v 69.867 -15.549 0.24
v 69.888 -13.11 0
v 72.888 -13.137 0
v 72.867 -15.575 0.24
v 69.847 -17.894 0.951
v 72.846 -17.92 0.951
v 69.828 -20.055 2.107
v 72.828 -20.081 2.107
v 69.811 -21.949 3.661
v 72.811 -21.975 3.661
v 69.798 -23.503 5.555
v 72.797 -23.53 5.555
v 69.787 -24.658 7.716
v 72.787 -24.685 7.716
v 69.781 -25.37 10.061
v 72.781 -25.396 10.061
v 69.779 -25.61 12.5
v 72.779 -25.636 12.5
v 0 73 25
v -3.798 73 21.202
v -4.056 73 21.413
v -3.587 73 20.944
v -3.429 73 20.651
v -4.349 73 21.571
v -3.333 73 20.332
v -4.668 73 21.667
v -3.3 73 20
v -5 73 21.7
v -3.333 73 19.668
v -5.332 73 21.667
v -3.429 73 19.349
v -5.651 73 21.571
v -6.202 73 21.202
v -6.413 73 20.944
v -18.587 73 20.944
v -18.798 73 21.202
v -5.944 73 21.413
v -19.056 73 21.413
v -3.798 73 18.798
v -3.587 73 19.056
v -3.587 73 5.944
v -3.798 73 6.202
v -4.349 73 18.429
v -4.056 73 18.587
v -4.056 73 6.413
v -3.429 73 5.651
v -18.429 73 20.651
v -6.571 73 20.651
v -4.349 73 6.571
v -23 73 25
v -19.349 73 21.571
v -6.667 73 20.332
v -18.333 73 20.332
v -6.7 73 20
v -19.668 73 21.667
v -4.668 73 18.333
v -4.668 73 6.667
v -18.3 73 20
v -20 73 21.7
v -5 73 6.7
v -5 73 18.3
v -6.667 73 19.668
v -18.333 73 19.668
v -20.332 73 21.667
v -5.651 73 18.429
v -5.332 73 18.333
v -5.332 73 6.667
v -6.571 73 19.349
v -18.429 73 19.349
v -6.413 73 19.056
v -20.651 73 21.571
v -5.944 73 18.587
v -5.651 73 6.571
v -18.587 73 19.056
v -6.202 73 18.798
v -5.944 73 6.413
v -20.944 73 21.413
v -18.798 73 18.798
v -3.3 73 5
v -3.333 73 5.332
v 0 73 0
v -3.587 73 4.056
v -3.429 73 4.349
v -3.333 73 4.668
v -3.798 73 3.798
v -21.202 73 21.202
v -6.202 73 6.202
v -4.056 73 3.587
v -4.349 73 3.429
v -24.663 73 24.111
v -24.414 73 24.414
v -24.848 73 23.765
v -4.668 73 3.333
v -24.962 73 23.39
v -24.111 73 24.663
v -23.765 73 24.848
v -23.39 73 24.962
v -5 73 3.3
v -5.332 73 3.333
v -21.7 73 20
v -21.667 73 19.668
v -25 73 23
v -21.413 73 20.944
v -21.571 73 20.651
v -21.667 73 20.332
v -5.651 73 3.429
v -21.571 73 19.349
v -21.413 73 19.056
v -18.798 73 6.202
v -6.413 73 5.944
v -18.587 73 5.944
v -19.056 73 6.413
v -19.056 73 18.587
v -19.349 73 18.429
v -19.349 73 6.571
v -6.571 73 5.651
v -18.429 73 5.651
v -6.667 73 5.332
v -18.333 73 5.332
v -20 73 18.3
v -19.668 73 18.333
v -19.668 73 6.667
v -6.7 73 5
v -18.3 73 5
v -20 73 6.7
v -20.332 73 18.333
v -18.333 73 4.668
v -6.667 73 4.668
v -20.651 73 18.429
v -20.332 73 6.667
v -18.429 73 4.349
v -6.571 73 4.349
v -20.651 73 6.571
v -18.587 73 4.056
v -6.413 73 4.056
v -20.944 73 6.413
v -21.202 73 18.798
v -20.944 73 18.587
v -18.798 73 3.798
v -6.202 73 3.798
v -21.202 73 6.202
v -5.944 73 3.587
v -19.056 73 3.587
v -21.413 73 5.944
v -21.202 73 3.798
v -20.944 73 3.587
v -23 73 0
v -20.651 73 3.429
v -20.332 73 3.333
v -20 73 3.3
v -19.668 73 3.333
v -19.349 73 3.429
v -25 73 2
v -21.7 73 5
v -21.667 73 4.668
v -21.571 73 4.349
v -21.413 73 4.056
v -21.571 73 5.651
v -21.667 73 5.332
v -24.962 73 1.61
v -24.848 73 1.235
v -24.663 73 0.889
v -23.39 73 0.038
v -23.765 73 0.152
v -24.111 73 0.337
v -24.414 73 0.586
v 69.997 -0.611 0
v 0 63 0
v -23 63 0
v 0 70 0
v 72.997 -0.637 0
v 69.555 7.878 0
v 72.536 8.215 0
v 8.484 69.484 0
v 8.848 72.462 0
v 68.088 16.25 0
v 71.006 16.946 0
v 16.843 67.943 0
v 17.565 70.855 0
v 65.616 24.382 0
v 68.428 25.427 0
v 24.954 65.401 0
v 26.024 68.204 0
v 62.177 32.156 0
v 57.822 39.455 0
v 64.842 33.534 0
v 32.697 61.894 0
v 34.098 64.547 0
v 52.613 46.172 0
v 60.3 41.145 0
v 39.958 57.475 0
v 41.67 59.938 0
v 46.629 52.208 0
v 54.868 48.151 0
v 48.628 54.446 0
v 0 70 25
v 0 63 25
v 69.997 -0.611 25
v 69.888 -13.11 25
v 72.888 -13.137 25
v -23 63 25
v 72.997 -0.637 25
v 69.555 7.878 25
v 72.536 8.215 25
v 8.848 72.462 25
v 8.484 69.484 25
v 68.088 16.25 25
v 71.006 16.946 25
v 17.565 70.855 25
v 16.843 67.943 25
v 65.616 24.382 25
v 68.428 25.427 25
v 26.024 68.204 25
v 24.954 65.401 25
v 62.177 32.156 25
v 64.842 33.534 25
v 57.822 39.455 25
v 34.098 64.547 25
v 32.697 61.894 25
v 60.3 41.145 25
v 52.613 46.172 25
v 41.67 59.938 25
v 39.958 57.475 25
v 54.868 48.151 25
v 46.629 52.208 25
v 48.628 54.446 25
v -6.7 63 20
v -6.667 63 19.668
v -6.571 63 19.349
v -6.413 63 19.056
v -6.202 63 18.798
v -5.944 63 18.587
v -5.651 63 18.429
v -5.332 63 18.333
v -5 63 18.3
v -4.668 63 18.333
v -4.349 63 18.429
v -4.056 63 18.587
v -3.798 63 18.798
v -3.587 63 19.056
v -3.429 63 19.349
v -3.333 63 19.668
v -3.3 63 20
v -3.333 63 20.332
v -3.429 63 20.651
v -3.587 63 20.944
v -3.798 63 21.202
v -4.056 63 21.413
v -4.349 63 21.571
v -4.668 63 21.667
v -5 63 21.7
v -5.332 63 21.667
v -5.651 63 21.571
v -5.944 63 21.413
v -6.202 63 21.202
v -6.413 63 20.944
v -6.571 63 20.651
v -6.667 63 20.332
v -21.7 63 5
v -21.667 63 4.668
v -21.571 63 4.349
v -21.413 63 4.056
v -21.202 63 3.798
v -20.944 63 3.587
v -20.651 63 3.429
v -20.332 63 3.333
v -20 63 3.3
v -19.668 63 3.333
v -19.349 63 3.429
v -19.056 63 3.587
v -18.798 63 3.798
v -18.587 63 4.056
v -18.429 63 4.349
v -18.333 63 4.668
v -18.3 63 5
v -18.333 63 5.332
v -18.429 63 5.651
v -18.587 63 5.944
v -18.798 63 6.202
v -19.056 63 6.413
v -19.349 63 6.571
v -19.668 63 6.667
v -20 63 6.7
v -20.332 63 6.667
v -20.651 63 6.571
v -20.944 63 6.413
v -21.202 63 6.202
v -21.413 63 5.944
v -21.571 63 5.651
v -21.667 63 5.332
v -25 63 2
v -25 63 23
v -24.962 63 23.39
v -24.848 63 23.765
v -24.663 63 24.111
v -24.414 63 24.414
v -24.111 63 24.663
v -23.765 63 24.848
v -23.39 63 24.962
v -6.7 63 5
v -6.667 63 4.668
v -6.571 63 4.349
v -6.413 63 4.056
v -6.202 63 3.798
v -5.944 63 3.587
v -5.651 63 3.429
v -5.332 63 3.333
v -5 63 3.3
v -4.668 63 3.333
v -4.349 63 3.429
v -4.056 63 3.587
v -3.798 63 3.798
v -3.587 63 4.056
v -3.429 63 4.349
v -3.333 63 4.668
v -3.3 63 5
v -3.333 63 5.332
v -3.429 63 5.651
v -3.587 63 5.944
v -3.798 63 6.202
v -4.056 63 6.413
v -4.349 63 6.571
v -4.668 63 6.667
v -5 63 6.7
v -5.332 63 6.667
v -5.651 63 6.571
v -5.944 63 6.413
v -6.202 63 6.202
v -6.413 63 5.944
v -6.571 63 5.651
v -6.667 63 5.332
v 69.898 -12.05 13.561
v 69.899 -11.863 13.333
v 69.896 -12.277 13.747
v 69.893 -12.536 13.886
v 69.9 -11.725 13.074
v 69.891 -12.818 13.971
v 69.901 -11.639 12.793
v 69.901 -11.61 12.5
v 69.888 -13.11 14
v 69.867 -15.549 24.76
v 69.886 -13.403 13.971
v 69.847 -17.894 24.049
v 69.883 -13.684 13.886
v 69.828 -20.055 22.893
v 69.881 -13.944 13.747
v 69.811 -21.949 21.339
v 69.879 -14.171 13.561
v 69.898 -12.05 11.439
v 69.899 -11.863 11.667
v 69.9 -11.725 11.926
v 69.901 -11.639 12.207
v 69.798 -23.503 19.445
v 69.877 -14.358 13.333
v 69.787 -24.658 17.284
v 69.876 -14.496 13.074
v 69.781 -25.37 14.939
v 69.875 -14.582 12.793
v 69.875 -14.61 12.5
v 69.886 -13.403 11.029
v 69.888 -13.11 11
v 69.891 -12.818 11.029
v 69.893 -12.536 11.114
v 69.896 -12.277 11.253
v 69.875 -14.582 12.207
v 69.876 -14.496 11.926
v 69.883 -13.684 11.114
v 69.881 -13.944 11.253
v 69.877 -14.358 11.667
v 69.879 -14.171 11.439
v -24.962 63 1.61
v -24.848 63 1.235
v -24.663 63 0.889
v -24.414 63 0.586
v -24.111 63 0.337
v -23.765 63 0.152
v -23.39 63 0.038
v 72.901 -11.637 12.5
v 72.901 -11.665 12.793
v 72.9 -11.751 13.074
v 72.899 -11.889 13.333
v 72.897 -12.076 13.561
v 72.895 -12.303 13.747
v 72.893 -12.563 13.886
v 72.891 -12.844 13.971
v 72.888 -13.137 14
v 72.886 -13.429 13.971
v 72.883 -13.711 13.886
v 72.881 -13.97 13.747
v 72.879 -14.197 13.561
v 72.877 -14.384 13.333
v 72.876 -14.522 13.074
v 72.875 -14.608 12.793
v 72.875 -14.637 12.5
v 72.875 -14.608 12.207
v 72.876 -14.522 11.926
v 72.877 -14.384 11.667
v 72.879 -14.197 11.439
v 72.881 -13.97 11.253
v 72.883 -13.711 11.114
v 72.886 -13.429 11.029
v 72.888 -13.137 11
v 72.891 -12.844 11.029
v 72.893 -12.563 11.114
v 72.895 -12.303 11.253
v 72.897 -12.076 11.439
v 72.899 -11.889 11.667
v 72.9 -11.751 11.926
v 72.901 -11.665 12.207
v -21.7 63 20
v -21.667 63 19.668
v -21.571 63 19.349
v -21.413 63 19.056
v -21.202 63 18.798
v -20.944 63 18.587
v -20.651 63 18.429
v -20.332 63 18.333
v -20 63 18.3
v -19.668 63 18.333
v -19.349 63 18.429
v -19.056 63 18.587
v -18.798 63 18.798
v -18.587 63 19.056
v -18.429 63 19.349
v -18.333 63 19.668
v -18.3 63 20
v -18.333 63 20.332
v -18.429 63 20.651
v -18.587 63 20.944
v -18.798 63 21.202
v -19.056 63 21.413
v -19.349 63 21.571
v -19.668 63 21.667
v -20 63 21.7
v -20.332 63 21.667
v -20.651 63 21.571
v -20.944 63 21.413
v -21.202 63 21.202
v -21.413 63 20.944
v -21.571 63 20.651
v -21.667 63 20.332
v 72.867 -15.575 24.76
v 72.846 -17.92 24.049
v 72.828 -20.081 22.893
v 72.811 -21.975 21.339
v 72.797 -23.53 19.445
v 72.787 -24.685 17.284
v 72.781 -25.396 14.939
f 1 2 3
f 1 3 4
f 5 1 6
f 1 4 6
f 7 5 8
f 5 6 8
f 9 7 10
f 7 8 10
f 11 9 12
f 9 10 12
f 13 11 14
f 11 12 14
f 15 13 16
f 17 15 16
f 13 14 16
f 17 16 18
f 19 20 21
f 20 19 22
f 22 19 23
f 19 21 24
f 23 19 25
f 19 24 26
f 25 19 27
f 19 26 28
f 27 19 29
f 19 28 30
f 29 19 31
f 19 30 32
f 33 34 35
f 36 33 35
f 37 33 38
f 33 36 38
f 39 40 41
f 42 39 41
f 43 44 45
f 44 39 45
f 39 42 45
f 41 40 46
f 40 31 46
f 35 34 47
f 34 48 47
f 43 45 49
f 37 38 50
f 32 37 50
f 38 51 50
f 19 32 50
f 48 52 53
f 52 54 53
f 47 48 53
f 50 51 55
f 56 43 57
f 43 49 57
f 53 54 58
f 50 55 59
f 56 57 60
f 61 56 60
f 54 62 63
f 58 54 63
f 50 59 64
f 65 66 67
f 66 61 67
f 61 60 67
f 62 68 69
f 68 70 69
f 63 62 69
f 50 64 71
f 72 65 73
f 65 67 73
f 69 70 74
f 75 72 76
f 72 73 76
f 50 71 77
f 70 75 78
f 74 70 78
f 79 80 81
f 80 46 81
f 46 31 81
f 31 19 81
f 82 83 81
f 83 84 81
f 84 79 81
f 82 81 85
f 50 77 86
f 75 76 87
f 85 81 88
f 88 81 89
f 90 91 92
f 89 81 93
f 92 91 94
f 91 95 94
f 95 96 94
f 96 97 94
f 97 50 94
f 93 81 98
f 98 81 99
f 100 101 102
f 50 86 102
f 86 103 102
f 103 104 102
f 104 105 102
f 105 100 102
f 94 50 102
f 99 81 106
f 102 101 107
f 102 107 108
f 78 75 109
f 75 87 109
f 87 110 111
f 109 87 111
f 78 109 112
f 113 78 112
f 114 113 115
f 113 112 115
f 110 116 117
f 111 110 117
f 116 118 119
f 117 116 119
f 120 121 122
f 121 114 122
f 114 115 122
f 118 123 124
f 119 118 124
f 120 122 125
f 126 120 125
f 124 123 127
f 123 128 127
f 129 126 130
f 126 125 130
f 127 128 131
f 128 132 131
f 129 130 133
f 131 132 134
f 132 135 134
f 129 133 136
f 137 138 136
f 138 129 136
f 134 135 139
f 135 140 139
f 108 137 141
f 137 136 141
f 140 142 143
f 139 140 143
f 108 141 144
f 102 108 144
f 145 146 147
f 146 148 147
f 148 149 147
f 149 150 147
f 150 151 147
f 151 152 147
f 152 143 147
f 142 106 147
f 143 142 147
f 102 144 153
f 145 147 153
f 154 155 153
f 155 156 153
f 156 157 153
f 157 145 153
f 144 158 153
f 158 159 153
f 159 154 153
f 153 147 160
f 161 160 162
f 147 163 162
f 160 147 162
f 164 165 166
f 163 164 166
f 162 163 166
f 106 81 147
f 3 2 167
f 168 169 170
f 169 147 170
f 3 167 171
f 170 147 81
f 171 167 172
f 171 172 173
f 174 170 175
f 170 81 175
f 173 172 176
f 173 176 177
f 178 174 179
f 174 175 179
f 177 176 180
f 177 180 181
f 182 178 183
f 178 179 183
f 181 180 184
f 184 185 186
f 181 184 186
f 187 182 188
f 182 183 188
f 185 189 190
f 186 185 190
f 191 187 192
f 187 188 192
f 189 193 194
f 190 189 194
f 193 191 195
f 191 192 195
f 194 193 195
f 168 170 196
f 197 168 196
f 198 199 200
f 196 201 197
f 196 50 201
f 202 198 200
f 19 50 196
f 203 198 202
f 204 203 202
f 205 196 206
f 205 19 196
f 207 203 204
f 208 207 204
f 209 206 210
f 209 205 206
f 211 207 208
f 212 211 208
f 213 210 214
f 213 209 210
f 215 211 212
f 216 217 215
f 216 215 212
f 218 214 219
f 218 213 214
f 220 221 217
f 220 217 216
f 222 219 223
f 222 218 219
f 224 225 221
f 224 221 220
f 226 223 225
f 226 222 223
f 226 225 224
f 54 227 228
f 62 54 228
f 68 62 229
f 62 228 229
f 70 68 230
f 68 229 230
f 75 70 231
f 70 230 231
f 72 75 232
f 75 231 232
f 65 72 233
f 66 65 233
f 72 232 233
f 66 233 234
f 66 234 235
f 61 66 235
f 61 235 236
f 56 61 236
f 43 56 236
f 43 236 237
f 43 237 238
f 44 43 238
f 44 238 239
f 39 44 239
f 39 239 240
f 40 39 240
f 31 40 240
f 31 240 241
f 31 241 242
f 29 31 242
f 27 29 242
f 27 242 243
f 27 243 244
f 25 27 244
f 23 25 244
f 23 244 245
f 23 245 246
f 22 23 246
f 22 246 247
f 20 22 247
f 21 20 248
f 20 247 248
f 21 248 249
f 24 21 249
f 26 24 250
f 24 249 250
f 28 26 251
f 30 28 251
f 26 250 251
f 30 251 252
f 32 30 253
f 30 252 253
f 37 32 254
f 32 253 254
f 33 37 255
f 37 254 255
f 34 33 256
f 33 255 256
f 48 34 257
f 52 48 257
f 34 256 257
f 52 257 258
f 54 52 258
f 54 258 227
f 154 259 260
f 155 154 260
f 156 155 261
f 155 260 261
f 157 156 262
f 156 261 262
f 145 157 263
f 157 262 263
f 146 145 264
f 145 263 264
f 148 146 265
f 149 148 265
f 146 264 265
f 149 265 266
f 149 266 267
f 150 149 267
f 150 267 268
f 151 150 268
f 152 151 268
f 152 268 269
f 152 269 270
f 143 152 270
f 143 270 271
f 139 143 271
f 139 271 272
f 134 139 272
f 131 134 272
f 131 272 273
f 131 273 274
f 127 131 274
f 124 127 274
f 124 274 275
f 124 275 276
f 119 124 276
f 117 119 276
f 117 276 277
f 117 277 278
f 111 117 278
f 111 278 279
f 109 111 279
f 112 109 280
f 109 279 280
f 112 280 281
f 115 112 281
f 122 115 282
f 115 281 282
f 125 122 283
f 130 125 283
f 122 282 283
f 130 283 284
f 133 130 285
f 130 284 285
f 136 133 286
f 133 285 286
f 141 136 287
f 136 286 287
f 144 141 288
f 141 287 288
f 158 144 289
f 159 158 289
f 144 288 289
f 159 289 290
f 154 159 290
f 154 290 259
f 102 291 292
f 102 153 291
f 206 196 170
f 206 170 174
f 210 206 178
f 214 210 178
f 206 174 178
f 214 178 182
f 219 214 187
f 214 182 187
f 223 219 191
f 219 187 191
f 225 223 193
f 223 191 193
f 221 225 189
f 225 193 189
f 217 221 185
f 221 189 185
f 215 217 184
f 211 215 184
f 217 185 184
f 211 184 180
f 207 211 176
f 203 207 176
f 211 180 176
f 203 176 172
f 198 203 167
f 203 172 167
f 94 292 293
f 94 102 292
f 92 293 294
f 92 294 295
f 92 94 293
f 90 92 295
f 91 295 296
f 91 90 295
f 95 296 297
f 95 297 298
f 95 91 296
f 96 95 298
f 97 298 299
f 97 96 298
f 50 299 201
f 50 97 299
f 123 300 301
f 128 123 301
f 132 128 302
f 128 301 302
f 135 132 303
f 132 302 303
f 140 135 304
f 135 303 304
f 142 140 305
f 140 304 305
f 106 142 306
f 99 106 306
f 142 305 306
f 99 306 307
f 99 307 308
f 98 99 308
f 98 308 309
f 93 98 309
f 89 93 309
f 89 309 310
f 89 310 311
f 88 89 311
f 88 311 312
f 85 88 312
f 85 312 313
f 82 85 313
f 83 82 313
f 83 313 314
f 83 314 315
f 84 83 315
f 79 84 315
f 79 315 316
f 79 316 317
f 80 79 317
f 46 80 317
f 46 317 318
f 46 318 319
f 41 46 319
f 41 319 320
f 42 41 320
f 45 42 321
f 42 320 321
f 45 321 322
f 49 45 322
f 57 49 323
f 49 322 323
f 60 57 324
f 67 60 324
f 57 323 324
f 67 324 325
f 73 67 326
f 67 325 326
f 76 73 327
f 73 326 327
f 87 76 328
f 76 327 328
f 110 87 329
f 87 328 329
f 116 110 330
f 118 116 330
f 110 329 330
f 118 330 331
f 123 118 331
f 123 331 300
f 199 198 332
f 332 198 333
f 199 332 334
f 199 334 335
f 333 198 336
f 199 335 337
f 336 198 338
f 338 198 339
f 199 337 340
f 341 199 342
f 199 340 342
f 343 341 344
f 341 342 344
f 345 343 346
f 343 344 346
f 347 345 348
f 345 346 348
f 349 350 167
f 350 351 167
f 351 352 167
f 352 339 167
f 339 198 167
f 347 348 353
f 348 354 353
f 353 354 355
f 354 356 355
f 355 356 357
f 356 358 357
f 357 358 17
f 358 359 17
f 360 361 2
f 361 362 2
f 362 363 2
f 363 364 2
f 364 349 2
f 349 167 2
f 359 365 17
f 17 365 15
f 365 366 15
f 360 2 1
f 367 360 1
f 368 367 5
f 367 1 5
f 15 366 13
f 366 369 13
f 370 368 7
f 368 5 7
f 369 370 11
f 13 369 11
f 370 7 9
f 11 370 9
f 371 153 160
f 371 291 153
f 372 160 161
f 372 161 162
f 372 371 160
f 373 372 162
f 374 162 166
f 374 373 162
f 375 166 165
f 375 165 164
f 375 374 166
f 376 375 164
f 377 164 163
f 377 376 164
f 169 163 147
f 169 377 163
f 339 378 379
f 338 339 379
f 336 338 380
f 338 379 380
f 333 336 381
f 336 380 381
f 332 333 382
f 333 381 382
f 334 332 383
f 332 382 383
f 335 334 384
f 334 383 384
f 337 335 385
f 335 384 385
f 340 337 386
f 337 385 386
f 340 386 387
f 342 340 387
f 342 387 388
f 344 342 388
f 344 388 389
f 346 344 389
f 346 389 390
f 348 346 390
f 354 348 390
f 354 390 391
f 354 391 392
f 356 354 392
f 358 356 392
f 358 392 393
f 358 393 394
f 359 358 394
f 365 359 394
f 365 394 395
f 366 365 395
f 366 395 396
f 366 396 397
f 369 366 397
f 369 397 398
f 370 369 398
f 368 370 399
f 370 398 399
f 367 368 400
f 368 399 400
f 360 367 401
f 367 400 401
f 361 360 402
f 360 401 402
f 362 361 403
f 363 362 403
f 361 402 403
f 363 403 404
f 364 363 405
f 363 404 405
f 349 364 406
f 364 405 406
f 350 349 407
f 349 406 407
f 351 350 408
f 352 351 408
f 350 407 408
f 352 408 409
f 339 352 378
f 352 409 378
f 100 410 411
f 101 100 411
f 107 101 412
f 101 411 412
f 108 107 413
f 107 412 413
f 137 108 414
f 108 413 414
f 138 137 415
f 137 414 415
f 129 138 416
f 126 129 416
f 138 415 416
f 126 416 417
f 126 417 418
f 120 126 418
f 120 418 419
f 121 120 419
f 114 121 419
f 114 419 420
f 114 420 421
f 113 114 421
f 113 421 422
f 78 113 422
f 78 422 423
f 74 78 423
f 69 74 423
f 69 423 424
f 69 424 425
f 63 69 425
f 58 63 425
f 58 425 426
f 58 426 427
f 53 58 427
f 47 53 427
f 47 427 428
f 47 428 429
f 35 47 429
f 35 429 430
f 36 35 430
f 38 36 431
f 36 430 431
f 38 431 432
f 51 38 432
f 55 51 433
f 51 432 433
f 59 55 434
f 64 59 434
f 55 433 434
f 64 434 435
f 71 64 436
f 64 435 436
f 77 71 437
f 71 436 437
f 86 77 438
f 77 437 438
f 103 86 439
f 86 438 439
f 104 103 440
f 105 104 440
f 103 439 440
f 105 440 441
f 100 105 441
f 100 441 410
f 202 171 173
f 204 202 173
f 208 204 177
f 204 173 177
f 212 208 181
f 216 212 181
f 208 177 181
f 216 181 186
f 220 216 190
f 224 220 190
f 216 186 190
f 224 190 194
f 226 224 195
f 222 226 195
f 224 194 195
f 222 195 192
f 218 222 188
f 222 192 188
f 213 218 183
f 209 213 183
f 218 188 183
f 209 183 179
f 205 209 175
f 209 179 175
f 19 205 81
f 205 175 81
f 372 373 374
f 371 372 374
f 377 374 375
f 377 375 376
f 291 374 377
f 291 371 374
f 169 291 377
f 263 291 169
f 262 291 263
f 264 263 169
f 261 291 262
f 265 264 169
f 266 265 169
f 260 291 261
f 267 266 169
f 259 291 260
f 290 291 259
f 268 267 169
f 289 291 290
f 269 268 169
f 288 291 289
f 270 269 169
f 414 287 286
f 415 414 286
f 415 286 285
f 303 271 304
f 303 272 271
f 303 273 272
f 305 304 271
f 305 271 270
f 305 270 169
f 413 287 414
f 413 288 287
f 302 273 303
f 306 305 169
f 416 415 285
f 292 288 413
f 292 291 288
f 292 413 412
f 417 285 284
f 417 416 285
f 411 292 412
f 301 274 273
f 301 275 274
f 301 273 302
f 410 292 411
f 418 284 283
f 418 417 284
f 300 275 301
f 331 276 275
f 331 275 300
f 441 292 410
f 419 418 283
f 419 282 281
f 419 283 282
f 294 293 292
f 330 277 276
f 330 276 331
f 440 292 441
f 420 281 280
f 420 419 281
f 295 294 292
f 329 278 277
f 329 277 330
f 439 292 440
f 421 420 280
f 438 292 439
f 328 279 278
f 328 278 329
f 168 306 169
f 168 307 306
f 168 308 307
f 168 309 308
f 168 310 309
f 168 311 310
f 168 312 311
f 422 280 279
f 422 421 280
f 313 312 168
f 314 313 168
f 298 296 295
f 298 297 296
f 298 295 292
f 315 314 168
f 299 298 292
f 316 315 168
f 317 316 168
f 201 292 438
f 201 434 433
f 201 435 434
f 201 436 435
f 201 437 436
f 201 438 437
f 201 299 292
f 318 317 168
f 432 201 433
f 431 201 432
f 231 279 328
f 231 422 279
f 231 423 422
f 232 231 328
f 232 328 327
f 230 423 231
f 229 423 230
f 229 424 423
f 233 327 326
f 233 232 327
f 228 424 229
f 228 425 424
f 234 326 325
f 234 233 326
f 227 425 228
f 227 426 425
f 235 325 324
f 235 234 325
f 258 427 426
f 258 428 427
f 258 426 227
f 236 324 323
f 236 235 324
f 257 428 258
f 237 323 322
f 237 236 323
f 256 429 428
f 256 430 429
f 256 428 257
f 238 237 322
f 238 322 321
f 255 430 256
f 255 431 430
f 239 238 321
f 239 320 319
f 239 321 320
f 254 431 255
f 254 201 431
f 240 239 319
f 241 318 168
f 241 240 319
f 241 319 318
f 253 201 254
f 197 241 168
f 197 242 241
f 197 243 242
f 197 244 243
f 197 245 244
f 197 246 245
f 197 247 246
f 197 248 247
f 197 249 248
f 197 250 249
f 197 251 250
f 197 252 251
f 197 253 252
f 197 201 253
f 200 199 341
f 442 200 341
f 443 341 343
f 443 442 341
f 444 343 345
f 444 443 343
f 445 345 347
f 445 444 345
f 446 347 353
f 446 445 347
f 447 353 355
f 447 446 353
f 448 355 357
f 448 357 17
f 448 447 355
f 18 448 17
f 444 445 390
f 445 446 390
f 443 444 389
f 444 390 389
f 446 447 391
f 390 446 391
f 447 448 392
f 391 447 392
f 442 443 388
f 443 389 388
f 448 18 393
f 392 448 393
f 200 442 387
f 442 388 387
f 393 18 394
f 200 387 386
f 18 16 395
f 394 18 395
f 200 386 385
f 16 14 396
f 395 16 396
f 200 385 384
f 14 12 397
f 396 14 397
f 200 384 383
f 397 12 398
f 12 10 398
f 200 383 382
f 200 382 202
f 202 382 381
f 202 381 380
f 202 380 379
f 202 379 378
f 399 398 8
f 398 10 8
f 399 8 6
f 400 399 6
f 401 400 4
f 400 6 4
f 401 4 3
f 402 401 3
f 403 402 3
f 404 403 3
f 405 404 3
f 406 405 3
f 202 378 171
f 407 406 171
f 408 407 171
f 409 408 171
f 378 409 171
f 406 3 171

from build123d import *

# Parameters (mm, degrees)
BOSS_EXTRUDE1_DEPTH  = 25
CUT_EXTRUDE1_REACH   = 127.103
SKETCH6_R            = 1.5
FILLET1_R            = 12.5
SKETCH8_W            = 25
SKETCH8_H            = 25
BOSS_EXTRUDE2_DEPTH  = 7
FILLET2_R            = 2
M3_CLEARANCE_HOLE1_D = 3.4


with BuildPart() as part:
    # Sketch2 → Boss-Extrude1 (new body)
    with BuildSketch(Plane.XY):
        with BuildLine():
            Line((0, 73), (-25, 73))
            Line((-25, 73), (-25, 70))
            Line((-25, 70), (0, 70))
            ThreePointArc((0, 70), (49.712976294, 49.281030712), (69.997334614, -0.610857485))
            Line((69.997334614, -0.610857485), (69.779171227, -25.609905561))
            Line((69.779171227, -25.609905561), (72.779056996, -25.636085168))
            Line((72.779056996, -25.636085168), (72.997220384, -0.637037091))
            ThreePointArc((72.997220384, -0.637037091), (51.84353242, 51.393074885), (0, 73))
        make_face()
    extrude(amount=BOSS_EXTRUDE1_DEPTH)

    # Sketch6 → Cut-Extrude1 (cut, up to next)
    with BuildSketch(Plane(origin=(72.997220384, -0.637037091, 0), x_dir=(0, 0, -1), z_dir=(0.9999619230641714, -0.00872653549837746, 0)), mode=Mode.PRIVATE) as cut_extrude1_sk1:
        with Locations(Location((-12.5, -12.5, 0), (0, 0, 90))):
            Circle(SKETCH6_R)
    cut_extrude1_tool1 = extrude(cut_extrude1_sk1.sketch, amount=-CUT_EXTRUDE1_REACH, mode=Mode.PRIVATE) & part.part
    add(cut_extrude1_tool1.solids().sort_by_distance((72.888139, -13.136561, 12.5))[0], mode=Mode.SUBTRACT)

    # Fillet1
    fillet1_edges = [part.edges().sort_by_distance(p)[0] for p in [
        (71.279114112, -25.622995365, 0),
        (71.279114112, -25.622995365, 25),
    ]]
    fillet(fillet1_edges, radius=FILLET1_R - 0.0001)  # a hair under: the kernel refuses the full size

    # Sketch8 → Boss-Extrude2 (add)
    with BuildSketch(Plane.XZ.offset(-70)):
        with Locations((-12.5, 12.5)):
            Rectangle(SKETCH8_W, SKETCH8_H)
    extrude(amount=BOSS_EXTRUDE2_DEPTH)

    # Fillet2
    fillet2_edges = [part.edges().sort_by_distance(p)[0] for p in [
        (-25, 68, 25),
        (-25, 68, 0),
    ]]
    fillet(fillet2_edges, radius=FILLET2_R)

    # M3 Clearance Hole1 (through all)
    with Locations(Plane(origin=(0, 73, 0), x_dir=(1, 0, 0), z_dir=(0, 1, 0))):
        with Locations((-20, -5), (-5, -20), (-20, -20), (-5, -5)):
            Hole(M3_CLEARANCE_HOLE1_D / 2)


solid = part.part
